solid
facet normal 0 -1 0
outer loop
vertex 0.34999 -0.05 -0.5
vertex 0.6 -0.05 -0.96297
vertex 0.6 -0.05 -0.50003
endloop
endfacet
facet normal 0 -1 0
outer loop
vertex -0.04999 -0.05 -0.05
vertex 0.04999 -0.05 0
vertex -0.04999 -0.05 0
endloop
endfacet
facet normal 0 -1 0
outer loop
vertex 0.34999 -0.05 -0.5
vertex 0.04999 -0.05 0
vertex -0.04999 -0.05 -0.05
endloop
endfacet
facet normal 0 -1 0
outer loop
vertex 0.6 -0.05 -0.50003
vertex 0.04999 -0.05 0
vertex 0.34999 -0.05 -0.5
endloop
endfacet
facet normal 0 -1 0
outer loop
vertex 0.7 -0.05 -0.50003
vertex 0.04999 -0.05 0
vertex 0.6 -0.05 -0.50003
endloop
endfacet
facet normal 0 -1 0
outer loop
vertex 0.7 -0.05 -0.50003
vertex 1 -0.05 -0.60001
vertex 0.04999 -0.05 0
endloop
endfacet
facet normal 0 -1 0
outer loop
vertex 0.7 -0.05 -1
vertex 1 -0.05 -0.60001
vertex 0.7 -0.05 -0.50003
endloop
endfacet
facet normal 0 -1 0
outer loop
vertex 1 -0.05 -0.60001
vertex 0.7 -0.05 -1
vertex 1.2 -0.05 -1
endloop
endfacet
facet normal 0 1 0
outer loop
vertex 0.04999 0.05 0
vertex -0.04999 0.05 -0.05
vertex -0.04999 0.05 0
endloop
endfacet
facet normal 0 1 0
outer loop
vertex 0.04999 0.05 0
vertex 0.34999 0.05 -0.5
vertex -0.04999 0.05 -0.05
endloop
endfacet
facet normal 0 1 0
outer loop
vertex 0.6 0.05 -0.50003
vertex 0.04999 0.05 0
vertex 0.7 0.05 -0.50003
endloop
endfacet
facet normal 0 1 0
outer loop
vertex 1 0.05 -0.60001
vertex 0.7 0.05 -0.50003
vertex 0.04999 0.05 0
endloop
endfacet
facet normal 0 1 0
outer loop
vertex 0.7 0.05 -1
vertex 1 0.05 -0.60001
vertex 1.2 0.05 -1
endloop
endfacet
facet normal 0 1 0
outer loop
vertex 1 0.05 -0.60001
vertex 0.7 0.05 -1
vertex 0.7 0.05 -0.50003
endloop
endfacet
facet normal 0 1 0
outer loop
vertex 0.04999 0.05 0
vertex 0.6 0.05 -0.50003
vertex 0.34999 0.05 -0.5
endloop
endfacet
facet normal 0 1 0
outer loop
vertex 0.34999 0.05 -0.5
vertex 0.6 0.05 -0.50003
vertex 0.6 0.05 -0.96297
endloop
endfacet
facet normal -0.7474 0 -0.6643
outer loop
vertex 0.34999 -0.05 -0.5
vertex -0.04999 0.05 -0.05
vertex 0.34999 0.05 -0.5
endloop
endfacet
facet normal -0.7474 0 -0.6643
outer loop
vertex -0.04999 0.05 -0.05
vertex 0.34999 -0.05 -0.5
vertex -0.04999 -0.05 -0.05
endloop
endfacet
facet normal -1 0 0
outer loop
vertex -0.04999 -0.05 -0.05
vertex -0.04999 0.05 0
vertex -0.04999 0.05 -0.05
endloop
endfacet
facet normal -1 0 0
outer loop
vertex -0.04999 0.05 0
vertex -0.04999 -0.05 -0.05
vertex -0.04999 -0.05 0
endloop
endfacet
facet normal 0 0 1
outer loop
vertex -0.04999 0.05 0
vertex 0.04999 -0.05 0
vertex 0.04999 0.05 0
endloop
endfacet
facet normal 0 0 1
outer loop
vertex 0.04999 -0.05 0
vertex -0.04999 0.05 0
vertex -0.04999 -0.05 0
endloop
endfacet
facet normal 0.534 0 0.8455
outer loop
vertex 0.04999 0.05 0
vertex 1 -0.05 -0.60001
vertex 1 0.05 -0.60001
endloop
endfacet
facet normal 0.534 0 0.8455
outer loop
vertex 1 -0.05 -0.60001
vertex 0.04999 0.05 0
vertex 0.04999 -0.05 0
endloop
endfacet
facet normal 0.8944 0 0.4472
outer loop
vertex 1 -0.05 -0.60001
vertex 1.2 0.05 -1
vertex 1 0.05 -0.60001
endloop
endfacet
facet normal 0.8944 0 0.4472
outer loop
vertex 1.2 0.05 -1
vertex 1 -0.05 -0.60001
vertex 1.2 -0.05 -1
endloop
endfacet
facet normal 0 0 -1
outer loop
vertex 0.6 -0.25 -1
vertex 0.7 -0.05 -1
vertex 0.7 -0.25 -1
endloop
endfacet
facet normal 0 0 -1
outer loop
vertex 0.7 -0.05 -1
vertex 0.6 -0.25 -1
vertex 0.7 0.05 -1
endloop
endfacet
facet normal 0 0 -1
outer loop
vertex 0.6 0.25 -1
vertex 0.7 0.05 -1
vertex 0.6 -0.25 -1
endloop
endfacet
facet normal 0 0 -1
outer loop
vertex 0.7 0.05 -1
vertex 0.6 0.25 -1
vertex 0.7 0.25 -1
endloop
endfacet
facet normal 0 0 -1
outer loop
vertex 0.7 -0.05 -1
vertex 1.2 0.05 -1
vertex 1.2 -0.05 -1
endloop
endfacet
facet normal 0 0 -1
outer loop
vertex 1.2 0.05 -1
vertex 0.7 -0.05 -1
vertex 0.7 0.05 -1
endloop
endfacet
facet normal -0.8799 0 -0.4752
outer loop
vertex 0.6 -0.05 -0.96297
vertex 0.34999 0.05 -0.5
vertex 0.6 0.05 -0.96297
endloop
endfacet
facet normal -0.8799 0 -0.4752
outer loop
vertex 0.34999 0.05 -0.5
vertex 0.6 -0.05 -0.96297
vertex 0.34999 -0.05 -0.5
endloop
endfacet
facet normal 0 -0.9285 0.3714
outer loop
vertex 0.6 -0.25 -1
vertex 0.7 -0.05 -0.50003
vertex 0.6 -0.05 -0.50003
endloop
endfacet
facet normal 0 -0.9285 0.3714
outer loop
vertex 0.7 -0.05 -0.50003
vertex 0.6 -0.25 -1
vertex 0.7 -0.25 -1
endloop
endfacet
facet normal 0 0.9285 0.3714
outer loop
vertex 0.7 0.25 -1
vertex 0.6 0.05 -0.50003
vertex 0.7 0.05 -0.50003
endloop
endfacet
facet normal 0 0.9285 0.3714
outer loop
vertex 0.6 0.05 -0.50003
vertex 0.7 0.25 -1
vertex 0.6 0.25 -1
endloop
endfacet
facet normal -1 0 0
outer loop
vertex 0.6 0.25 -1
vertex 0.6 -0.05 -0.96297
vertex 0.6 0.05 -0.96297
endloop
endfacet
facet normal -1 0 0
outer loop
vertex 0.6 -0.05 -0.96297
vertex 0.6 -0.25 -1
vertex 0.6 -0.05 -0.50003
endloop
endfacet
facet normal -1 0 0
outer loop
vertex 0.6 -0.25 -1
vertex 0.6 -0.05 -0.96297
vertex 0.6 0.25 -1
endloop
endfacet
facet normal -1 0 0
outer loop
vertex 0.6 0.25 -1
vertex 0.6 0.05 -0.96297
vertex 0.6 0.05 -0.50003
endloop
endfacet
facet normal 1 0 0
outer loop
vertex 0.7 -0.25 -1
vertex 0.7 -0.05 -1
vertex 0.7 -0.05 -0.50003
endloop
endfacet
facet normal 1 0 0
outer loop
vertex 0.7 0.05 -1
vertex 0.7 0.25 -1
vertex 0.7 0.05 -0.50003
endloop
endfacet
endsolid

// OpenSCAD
//----------------------------------------------
// Custom Support 
// Size must be 1x1x1 
// Tested in Cura with Support Size : 30
// Recommanded Infill support > 12%
//----------------------------------------------
$fn=30;

rotate([0,0,180]) translate([-0.5,-0.5,-1.0]) 
union() {
    translate([0.5,0.55,0.0]) rotate([90, 0, 0]) {
			linear_extrude(height=0.1) {
				polygon(points=[[-0.62,0],[-1.20,0],[-1,0.4],[-0.05,1],[0.05,1],[0.05,0.95],[-0.35,0.5]], convexity=1);
			}
		}
    translate([-0.2,0.5,0.0]) rotate([90, 0, 90]) {
			linear_extrude(height=0.1) {
				polygon(points=[[-0.25,0],[0.25,0],[0.05,0.5],[-0.05,0.5]], convexity=1);
			}        
    }
}
